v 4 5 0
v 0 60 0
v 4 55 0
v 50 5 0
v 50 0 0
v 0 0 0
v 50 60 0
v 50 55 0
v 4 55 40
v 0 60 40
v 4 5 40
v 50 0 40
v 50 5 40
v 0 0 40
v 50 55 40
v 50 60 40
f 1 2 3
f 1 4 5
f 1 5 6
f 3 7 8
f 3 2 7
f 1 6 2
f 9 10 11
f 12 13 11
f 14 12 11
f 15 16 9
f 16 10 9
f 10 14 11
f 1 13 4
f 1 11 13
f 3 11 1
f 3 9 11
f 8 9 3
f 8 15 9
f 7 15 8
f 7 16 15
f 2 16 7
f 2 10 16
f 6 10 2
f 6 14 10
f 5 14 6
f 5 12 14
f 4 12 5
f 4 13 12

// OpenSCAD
$fn = 32;

// ----------------------------------------------------------------------
// Structural section: channel 50 x 60 mm
// ----------------------------------------------------------------------

// --- parameters (mm) ---
sec_w = 50;               // channel width, X
sec_h = 60;               // channel height, Y
flange_t = 5;             // flange thickness
web_t = 4;                // web thickness
plate_t = 40;             // cut length, Z (extrusion height)

profile = [[0, 0], [50, 0], [50, 5], [4, 5], [4, 55], [50, 55], [50, 60], [0, 60]];  // primary outline, 8 points, counter clockwise

// --- the one profile operation ---
linear_extrude(height = plate_t) polygon(points = profile);
